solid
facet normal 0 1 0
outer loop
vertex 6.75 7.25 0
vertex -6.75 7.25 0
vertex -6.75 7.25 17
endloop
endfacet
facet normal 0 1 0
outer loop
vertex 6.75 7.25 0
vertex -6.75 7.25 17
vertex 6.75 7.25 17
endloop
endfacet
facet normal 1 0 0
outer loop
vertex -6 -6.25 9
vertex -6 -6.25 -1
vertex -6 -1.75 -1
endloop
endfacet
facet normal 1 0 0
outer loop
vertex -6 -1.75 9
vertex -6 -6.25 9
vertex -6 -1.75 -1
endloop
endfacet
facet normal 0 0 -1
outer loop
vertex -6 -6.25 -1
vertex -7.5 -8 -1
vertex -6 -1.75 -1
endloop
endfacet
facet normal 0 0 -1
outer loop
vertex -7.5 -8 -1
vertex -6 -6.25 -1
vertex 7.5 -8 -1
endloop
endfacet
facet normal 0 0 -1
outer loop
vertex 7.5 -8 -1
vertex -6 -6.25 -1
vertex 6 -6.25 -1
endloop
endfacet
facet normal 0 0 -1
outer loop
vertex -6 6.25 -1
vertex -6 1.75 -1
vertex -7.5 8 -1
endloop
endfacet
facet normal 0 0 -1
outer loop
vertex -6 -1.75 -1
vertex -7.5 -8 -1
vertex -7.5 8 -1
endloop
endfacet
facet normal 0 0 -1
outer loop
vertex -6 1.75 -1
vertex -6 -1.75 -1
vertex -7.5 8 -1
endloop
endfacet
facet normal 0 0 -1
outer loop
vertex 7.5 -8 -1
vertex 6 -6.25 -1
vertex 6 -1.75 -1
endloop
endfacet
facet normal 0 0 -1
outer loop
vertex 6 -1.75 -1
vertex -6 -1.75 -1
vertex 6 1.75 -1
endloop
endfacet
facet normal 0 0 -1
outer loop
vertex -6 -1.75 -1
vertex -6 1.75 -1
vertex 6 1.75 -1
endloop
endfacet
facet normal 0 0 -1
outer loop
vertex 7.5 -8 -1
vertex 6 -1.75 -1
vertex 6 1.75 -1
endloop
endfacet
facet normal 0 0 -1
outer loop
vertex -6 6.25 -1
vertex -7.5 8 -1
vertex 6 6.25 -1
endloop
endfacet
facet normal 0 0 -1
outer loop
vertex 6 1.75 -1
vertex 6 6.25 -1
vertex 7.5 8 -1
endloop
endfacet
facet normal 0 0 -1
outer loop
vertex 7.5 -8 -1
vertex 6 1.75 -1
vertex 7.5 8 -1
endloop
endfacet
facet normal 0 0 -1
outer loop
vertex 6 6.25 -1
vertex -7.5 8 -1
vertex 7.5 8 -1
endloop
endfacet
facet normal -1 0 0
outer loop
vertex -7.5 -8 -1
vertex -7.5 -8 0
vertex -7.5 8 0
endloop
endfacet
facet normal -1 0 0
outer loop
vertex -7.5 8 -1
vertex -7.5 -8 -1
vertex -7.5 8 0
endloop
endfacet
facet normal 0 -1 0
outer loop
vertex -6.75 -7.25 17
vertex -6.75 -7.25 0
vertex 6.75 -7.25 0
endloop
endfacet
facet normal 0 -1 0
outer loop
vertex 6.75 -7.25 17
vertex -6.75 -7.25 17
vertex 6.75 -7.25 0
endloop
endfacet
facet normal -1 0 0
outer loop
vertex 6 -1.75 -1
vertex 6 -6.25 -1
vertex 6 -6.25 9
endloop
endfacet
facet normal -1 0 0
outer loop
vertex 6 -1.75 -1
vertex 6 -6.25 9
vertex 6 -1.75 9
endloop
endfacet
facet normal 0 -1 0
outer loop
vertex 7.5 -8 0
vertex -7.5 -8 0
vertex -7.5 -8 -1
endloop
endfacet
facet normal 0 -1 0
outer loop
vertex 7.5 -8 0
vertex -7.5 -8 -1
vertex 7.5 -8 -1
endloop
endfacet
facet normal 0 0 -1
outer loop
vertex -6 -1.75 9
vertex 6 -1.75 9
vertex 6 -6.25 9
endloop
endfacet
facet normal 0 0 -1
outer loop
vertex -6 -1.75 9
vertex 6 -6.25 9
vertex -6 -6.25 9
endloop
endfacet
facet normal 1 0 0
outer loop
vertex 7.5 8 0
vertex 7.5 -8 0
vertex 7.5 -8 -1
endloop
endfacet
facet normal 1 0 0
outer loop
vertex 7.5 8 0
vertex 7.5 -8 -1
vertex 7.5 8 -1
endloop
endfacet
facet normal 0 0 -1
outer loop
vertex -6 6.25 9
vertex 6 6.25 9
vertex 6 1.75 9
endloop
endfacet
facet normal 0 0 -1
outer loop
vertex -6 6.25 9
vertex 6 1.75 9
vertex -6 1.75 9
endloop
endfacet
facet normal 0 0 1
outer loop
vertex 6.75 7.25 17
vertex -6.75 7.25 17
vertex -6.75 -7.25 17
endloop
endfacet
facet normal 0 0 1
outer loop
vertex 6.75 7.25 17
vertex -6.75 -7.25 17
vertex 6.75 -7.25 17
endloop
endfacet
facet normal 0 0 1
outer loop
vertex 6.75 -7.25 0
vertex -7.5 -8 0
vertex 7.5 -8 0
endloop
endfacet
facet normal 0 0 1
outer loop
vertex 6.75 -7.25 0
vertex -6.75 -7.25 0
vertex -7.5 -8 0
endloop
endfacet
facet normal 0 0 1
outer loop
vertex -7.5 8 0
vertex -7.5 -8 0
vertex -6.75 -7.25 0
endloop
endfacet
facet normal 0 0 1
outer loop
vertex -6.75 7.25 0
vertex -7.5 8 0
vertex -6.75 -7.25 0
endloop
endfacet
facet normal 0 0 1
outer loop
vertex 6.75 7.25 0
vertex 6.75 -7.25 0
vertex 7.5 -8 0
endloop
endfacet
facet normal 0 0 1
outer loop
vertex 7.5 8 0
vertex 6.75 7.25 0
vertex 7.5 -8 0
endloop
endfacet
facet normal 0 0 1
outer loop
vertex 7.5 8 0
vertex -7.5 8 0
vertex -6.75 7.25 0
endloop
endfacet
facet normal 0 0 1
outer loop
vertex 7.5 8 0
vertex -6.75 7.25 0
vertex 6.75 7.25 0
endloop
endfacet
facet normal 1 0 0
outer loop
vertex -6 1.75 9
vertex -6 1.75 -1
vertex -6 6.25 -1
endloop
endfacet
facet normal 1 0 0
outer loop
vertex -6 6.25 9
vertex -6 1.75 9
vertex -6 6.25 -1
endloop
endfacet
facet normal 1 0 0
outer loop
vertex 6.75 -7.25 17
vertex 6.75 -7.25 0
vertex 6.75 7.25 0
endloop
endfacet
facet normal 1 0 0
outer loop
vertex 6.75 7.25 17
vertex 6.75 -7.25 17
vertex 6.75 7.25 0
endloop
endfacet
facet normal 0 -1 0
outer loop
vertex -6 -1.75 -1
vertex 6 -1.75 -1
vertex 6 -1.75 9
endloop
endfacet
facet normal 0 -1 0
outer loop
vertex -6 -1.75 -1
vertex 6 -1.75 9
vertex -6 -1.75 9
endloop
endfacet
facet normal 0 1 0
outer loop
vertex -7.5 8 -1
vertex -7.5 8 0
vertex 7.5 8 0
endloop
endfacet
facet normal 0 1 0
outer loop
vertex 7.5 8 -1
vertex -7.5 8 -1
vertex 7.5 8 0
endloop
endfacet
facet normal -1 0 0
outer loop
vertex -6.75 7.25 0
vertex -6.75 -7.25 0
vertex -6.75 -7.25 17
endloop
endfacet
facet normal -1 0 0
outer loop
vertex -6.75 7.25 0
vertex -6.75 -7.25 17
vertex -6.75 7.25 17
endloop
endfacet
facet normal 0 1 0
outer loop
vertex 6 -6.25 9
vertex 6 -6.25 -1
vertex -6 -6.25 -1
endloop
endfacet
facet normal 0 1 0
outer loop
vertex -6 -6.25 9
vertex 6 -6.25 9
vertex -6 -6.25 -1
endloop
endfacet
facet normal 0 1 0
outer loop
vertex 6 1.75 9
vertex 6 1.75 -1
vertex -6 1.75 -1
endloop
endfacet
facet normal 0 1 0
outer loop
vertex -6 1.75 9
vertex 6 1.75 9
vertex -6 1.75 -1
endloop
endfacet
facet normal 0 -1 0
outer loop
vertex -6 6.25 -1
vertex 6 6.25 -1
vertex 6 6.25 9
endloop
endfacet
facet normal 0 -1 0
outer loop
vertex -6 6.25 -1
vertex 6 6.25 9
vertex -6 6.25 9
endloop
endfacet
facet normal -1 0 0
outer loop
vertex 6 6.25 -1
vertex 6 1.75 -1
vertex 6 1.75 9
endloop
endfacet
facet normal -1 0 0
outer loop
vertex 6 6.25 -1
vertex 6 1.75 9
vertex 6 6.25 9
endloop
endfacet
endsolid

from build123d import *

# Parameters (mm, degrees)
SKETCH1_W           = 13.5
SKETCH1_H           = 14.5
BOSS_EXTRUDE1_DEPTH = 17
SKETCH2_W           = 15
SKETCH2_H           = 16
BOSS_EXTRUDE2_DEPTH = 1
SKETCH3_W           = 12
SKETCH3_H           = 4.5
CUT_EXTRUDE1_DEPTH  = 10


with BuildPart() as part:
    # Sketch1 → Boss-Extrude1 (new body)
    with BuildSketch(Plane.XY):
        Rectangle(SKETCH1_W, SKETCH1_H)
    extrude(amount=BOSS_EXTRUDE1_DEPTH)

    # Sketch2 → Boss-Extrude2 (add)
    with BuildSketch(Plane.XY):
        Rectangle(SKETCH2_W, SKETCH2_H)
    extrude(amount=-BOSS_EXTRUDE2_DEPTH)

    # Sketch3 → Cut-Extrude1 (cut)
    with BuildSketch(Plane(origin=(0, 0, -1), x_dir=(-1, 0, 0), z_dir=(0, 0, -1))):
        with Locations((0, 4)):
            Rectangle(SKETCH3_W, SKETCH3_H)
        with Locations((0, -4)):
            Rectangle(SKETCH3_W, SKETCH3_H)
    extrude(amount=-CUT_EXTRUDE1_DEPTH, mode=Mode.SUBTRACT)


solid = part.part
